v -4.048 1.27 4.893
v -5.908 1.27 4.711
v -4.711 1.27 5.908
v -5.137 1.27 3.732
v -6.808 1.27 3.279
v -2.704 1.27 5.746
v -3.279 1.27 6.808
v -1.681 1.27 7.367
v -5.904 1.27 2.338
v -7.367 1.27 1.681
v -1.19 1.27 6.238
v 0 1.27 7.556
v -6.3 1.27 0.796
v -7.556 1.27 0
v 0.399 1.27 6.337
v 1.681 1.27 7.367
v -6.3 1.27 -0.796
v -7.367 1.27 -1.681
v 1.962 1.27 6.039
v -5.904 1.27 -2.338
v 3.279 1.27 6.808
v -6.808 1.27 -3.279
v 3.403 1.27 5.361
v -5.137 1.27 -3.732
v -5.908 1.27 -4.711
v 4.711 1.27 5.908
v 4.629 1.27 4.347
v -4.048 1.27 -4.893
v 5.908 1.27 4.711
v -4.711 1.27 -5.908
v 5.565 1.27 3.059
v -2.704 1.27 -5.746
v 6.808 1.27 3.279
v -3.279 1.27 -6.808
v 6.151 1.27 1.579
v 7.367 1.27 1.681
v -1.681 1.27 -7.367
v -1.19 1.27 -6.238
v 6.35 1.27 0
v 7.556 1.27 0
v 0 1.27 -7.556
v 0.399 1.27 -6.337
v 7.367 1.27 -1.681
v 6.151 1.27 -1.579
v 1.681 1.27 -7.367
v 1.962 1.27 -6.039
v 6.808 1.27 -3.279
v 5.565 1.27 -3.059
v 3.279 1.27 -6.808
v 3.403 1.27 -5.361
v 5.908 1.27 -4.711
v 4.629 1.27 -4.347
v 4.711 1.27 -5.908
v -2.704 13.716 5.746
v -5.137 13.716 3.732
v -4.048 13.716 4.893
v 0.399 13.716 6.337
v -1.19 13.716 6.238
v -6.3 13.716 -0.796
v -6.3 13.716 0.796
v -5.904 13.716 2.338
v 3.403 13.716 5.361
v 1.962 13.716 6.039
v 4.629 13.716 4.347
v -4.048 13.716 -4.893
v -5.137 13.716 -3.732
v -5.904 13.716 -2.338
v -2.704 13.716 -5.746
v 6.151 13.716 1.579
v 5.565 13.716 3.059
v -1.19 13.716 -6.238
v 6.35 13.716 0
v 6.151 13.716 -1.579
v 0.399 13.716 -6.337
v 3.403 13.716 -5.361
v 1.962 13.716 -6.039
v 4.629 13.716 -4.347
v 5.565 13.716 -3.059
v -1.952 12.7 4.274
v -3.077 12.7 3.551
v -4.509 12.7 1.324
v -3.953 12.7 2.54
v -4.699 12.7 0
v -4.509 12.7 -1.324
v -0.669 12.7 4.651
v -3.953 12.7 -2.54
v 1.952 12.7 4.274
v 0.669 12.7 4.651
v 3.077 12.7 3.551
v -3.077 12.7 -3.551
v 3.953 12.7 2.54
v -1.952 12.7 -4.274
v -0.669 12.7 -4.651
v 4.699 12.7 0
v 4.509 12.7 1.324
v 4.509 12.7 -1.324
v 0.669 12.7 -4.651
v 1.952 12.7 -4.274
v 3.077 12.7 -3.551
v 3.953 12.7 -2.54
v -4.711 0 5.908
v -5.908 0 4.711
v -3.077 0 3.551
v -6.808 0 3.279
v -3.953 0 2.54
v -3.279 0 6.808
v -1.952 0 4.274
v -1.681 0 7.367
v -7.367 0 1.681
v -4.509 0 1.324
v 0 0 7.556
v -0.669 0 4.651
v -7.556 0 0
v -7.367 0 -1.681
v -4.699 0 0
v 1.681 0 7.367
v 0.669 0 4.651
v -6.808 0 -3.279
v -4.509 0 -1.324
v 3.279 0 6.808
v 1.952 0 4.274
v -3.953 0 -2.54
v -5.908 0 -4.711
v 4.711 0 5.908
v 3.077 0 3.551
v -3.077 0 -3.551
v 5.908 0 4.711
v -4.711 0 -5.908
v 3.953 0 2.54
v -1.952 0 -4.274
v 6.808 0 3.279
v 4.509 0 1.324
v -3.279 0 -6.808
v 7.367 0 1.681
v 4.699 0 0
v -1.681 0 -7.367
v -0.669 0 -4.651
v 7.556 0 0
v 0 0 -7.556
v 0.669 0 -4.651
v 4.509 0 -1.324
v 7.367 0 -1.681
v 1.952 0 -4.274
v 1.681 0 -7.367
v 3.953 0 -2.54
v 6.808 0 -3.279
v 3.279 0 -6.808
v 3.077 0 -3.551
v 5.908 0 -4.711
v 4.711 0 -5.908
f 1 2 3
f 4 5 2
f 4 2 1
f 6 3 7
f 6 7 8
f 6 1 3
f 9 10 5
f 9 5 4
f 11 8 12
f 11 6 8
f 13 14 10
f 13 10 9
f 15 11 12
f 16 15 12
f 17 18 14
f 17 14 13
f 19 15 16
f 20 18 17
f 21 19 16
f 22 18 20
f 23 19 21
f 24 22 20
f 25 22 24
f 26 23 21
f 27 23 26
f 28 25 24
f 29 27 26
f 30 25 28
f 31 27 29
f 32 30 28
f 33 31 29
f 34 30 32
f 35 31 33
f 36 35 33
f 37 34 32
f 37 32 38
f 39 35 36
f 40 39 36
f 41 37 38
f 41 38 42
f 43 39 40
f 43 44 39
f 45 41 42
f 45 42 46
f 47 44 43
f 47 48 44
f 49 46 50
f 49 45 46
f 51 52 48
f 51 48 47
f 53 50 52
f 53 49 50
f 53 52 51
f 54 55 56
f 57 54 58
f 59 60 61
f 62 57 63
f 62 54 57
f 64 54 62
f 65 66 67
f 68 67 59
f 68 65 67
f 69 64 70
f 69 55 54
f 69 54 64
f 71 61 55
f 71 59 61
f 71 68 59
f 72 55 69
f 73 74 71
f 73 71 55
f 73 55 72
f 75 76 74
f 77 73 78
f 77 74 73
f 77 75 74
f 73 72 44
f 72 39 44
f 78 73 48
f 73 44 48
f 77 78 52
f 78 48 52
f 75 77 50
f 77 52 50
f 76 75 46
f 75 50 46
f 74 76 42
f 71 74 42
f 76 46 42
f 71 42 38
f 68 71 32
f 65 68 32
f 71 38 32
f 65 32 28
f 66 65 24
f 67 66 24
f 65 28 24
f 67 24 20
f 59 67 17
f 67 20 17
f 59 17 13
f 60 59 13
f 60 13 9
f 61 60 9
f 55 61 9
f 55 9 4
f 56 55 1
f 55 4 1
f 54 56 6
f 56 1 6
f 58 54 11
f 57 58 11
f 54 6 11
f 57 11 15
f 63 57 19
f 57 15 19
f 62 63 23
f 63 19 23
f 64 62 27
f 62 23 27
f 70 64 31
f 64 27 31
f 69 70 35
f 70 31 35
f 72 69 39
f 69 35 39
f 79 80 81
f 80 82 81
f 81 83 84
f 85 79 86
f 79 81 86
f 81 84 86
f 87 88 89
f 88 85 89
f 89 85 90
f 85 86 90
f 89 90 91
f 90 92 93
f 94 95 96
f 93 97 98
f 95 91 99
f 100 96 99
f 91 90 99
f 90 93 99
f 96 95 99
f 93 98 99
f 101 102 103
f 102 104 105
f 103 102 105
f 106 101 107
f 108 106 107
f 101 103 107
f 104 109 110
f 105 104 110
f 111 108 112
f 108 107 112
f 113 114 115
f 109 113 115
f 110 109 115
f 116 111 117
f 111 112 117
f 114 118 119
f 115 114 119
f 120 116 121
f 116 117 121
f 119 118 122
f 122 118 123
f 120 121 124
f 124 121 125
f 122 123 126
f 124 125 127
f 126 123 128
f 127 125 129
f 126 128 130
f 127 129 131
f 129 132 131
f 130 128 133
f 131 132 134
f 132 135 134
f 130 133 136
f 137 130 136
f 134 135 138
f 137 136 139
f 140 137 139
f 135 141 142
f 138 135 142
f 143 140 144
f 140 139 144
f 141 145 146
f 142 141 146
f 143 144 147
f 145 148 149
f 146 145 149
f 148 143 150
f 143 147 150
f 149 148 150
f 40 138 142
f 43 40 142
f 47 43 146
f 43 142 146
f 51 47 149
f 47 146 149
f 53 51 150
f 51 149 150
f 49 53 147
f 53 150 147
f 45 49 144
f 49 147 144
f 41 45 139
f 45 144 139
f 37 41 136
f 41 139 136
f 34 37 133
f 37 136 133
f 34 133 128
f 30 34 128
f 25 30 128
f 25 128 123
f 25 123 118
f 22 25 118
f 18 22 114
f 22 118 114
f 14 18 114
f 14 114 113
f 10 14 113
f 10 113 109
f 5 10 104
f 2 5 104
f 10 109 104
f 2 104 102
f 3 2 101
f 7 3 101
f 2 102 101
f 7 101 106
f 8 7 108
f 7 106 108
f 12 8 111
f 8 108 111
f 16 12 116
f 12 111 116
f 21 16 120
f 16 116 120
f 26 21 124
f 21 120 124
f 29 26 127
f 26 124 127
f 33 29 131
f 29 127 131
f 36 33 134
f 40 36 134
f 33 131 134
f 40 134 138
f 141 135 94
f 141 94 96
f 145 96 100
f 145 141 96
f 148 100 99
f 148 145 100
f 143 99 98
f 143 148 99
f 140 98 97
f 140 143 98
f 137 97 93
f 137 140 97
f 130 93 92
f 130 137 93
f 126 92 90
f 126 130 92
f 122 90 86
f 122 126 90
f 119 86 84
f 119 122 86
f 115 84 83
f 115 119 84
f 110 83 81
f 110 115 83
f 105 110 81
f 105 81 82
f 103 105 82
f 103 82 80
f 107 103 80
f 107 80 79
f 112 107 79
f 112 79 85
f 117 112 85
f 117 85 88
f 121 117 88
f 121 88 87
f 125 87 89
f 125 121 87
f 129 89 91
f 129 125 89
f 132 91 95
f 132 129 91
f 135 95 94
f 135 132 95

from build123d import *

# Parameters (mm, degrees)
SKETCH1_R           = 6.35
SKETCH1_R_2         = 4.699
BOSS_EXTRUDE1_DEPTH = 13.716
SKETCH2_R           = 7.5565
SKETCH2_R_2         = 6.096
BOSS_EXTRUDE2_DEPTH = 1.27
SKETCH3_R           = 6.35
BOSS_EXTRUDE3_DEPTH = 1.016


with BuildPart() as part:
    # Sketch1 → Boss-Extrude1 (new body)
    with BuildSketch(Plane(origin=(0, 0, 0), x_dir=(1, 0, 0), z_dir=(0, 1, 0))):
        Circle(SKETCH1_R)
        Circle(SKETCH1_R_2, mode=Mode.SUBTRACT)
    extrude(amount=BOSS_EXTRUDE1_DEPTH)

    # Sketch2 → Boss-Extrude2 (add)
    with BuildSketch(Plane(origin=(0, 0, 0), x_dir=(1, 0, 0), z_dir=(0, 1, 0))):
        Circle(SKETCH2_R)
        Circle(SKETCH2_R_2, mode=Mode.SUBTRACT)
    extrude(amount=BOSS_EXTRUDE2_DEPTH)

    # Sketch3 → Boss-Extrude3 (add)
    with BuildSketch(Plane(origin=(0, 13.716, 0), x_dir=(1, 0, 0), z_dir=(0, 1, 0))):
        Circle(SKETCH3_R)
    extrude(amount=-BOSS_EXTRUDE3_DEPTH)


solid = part.part
